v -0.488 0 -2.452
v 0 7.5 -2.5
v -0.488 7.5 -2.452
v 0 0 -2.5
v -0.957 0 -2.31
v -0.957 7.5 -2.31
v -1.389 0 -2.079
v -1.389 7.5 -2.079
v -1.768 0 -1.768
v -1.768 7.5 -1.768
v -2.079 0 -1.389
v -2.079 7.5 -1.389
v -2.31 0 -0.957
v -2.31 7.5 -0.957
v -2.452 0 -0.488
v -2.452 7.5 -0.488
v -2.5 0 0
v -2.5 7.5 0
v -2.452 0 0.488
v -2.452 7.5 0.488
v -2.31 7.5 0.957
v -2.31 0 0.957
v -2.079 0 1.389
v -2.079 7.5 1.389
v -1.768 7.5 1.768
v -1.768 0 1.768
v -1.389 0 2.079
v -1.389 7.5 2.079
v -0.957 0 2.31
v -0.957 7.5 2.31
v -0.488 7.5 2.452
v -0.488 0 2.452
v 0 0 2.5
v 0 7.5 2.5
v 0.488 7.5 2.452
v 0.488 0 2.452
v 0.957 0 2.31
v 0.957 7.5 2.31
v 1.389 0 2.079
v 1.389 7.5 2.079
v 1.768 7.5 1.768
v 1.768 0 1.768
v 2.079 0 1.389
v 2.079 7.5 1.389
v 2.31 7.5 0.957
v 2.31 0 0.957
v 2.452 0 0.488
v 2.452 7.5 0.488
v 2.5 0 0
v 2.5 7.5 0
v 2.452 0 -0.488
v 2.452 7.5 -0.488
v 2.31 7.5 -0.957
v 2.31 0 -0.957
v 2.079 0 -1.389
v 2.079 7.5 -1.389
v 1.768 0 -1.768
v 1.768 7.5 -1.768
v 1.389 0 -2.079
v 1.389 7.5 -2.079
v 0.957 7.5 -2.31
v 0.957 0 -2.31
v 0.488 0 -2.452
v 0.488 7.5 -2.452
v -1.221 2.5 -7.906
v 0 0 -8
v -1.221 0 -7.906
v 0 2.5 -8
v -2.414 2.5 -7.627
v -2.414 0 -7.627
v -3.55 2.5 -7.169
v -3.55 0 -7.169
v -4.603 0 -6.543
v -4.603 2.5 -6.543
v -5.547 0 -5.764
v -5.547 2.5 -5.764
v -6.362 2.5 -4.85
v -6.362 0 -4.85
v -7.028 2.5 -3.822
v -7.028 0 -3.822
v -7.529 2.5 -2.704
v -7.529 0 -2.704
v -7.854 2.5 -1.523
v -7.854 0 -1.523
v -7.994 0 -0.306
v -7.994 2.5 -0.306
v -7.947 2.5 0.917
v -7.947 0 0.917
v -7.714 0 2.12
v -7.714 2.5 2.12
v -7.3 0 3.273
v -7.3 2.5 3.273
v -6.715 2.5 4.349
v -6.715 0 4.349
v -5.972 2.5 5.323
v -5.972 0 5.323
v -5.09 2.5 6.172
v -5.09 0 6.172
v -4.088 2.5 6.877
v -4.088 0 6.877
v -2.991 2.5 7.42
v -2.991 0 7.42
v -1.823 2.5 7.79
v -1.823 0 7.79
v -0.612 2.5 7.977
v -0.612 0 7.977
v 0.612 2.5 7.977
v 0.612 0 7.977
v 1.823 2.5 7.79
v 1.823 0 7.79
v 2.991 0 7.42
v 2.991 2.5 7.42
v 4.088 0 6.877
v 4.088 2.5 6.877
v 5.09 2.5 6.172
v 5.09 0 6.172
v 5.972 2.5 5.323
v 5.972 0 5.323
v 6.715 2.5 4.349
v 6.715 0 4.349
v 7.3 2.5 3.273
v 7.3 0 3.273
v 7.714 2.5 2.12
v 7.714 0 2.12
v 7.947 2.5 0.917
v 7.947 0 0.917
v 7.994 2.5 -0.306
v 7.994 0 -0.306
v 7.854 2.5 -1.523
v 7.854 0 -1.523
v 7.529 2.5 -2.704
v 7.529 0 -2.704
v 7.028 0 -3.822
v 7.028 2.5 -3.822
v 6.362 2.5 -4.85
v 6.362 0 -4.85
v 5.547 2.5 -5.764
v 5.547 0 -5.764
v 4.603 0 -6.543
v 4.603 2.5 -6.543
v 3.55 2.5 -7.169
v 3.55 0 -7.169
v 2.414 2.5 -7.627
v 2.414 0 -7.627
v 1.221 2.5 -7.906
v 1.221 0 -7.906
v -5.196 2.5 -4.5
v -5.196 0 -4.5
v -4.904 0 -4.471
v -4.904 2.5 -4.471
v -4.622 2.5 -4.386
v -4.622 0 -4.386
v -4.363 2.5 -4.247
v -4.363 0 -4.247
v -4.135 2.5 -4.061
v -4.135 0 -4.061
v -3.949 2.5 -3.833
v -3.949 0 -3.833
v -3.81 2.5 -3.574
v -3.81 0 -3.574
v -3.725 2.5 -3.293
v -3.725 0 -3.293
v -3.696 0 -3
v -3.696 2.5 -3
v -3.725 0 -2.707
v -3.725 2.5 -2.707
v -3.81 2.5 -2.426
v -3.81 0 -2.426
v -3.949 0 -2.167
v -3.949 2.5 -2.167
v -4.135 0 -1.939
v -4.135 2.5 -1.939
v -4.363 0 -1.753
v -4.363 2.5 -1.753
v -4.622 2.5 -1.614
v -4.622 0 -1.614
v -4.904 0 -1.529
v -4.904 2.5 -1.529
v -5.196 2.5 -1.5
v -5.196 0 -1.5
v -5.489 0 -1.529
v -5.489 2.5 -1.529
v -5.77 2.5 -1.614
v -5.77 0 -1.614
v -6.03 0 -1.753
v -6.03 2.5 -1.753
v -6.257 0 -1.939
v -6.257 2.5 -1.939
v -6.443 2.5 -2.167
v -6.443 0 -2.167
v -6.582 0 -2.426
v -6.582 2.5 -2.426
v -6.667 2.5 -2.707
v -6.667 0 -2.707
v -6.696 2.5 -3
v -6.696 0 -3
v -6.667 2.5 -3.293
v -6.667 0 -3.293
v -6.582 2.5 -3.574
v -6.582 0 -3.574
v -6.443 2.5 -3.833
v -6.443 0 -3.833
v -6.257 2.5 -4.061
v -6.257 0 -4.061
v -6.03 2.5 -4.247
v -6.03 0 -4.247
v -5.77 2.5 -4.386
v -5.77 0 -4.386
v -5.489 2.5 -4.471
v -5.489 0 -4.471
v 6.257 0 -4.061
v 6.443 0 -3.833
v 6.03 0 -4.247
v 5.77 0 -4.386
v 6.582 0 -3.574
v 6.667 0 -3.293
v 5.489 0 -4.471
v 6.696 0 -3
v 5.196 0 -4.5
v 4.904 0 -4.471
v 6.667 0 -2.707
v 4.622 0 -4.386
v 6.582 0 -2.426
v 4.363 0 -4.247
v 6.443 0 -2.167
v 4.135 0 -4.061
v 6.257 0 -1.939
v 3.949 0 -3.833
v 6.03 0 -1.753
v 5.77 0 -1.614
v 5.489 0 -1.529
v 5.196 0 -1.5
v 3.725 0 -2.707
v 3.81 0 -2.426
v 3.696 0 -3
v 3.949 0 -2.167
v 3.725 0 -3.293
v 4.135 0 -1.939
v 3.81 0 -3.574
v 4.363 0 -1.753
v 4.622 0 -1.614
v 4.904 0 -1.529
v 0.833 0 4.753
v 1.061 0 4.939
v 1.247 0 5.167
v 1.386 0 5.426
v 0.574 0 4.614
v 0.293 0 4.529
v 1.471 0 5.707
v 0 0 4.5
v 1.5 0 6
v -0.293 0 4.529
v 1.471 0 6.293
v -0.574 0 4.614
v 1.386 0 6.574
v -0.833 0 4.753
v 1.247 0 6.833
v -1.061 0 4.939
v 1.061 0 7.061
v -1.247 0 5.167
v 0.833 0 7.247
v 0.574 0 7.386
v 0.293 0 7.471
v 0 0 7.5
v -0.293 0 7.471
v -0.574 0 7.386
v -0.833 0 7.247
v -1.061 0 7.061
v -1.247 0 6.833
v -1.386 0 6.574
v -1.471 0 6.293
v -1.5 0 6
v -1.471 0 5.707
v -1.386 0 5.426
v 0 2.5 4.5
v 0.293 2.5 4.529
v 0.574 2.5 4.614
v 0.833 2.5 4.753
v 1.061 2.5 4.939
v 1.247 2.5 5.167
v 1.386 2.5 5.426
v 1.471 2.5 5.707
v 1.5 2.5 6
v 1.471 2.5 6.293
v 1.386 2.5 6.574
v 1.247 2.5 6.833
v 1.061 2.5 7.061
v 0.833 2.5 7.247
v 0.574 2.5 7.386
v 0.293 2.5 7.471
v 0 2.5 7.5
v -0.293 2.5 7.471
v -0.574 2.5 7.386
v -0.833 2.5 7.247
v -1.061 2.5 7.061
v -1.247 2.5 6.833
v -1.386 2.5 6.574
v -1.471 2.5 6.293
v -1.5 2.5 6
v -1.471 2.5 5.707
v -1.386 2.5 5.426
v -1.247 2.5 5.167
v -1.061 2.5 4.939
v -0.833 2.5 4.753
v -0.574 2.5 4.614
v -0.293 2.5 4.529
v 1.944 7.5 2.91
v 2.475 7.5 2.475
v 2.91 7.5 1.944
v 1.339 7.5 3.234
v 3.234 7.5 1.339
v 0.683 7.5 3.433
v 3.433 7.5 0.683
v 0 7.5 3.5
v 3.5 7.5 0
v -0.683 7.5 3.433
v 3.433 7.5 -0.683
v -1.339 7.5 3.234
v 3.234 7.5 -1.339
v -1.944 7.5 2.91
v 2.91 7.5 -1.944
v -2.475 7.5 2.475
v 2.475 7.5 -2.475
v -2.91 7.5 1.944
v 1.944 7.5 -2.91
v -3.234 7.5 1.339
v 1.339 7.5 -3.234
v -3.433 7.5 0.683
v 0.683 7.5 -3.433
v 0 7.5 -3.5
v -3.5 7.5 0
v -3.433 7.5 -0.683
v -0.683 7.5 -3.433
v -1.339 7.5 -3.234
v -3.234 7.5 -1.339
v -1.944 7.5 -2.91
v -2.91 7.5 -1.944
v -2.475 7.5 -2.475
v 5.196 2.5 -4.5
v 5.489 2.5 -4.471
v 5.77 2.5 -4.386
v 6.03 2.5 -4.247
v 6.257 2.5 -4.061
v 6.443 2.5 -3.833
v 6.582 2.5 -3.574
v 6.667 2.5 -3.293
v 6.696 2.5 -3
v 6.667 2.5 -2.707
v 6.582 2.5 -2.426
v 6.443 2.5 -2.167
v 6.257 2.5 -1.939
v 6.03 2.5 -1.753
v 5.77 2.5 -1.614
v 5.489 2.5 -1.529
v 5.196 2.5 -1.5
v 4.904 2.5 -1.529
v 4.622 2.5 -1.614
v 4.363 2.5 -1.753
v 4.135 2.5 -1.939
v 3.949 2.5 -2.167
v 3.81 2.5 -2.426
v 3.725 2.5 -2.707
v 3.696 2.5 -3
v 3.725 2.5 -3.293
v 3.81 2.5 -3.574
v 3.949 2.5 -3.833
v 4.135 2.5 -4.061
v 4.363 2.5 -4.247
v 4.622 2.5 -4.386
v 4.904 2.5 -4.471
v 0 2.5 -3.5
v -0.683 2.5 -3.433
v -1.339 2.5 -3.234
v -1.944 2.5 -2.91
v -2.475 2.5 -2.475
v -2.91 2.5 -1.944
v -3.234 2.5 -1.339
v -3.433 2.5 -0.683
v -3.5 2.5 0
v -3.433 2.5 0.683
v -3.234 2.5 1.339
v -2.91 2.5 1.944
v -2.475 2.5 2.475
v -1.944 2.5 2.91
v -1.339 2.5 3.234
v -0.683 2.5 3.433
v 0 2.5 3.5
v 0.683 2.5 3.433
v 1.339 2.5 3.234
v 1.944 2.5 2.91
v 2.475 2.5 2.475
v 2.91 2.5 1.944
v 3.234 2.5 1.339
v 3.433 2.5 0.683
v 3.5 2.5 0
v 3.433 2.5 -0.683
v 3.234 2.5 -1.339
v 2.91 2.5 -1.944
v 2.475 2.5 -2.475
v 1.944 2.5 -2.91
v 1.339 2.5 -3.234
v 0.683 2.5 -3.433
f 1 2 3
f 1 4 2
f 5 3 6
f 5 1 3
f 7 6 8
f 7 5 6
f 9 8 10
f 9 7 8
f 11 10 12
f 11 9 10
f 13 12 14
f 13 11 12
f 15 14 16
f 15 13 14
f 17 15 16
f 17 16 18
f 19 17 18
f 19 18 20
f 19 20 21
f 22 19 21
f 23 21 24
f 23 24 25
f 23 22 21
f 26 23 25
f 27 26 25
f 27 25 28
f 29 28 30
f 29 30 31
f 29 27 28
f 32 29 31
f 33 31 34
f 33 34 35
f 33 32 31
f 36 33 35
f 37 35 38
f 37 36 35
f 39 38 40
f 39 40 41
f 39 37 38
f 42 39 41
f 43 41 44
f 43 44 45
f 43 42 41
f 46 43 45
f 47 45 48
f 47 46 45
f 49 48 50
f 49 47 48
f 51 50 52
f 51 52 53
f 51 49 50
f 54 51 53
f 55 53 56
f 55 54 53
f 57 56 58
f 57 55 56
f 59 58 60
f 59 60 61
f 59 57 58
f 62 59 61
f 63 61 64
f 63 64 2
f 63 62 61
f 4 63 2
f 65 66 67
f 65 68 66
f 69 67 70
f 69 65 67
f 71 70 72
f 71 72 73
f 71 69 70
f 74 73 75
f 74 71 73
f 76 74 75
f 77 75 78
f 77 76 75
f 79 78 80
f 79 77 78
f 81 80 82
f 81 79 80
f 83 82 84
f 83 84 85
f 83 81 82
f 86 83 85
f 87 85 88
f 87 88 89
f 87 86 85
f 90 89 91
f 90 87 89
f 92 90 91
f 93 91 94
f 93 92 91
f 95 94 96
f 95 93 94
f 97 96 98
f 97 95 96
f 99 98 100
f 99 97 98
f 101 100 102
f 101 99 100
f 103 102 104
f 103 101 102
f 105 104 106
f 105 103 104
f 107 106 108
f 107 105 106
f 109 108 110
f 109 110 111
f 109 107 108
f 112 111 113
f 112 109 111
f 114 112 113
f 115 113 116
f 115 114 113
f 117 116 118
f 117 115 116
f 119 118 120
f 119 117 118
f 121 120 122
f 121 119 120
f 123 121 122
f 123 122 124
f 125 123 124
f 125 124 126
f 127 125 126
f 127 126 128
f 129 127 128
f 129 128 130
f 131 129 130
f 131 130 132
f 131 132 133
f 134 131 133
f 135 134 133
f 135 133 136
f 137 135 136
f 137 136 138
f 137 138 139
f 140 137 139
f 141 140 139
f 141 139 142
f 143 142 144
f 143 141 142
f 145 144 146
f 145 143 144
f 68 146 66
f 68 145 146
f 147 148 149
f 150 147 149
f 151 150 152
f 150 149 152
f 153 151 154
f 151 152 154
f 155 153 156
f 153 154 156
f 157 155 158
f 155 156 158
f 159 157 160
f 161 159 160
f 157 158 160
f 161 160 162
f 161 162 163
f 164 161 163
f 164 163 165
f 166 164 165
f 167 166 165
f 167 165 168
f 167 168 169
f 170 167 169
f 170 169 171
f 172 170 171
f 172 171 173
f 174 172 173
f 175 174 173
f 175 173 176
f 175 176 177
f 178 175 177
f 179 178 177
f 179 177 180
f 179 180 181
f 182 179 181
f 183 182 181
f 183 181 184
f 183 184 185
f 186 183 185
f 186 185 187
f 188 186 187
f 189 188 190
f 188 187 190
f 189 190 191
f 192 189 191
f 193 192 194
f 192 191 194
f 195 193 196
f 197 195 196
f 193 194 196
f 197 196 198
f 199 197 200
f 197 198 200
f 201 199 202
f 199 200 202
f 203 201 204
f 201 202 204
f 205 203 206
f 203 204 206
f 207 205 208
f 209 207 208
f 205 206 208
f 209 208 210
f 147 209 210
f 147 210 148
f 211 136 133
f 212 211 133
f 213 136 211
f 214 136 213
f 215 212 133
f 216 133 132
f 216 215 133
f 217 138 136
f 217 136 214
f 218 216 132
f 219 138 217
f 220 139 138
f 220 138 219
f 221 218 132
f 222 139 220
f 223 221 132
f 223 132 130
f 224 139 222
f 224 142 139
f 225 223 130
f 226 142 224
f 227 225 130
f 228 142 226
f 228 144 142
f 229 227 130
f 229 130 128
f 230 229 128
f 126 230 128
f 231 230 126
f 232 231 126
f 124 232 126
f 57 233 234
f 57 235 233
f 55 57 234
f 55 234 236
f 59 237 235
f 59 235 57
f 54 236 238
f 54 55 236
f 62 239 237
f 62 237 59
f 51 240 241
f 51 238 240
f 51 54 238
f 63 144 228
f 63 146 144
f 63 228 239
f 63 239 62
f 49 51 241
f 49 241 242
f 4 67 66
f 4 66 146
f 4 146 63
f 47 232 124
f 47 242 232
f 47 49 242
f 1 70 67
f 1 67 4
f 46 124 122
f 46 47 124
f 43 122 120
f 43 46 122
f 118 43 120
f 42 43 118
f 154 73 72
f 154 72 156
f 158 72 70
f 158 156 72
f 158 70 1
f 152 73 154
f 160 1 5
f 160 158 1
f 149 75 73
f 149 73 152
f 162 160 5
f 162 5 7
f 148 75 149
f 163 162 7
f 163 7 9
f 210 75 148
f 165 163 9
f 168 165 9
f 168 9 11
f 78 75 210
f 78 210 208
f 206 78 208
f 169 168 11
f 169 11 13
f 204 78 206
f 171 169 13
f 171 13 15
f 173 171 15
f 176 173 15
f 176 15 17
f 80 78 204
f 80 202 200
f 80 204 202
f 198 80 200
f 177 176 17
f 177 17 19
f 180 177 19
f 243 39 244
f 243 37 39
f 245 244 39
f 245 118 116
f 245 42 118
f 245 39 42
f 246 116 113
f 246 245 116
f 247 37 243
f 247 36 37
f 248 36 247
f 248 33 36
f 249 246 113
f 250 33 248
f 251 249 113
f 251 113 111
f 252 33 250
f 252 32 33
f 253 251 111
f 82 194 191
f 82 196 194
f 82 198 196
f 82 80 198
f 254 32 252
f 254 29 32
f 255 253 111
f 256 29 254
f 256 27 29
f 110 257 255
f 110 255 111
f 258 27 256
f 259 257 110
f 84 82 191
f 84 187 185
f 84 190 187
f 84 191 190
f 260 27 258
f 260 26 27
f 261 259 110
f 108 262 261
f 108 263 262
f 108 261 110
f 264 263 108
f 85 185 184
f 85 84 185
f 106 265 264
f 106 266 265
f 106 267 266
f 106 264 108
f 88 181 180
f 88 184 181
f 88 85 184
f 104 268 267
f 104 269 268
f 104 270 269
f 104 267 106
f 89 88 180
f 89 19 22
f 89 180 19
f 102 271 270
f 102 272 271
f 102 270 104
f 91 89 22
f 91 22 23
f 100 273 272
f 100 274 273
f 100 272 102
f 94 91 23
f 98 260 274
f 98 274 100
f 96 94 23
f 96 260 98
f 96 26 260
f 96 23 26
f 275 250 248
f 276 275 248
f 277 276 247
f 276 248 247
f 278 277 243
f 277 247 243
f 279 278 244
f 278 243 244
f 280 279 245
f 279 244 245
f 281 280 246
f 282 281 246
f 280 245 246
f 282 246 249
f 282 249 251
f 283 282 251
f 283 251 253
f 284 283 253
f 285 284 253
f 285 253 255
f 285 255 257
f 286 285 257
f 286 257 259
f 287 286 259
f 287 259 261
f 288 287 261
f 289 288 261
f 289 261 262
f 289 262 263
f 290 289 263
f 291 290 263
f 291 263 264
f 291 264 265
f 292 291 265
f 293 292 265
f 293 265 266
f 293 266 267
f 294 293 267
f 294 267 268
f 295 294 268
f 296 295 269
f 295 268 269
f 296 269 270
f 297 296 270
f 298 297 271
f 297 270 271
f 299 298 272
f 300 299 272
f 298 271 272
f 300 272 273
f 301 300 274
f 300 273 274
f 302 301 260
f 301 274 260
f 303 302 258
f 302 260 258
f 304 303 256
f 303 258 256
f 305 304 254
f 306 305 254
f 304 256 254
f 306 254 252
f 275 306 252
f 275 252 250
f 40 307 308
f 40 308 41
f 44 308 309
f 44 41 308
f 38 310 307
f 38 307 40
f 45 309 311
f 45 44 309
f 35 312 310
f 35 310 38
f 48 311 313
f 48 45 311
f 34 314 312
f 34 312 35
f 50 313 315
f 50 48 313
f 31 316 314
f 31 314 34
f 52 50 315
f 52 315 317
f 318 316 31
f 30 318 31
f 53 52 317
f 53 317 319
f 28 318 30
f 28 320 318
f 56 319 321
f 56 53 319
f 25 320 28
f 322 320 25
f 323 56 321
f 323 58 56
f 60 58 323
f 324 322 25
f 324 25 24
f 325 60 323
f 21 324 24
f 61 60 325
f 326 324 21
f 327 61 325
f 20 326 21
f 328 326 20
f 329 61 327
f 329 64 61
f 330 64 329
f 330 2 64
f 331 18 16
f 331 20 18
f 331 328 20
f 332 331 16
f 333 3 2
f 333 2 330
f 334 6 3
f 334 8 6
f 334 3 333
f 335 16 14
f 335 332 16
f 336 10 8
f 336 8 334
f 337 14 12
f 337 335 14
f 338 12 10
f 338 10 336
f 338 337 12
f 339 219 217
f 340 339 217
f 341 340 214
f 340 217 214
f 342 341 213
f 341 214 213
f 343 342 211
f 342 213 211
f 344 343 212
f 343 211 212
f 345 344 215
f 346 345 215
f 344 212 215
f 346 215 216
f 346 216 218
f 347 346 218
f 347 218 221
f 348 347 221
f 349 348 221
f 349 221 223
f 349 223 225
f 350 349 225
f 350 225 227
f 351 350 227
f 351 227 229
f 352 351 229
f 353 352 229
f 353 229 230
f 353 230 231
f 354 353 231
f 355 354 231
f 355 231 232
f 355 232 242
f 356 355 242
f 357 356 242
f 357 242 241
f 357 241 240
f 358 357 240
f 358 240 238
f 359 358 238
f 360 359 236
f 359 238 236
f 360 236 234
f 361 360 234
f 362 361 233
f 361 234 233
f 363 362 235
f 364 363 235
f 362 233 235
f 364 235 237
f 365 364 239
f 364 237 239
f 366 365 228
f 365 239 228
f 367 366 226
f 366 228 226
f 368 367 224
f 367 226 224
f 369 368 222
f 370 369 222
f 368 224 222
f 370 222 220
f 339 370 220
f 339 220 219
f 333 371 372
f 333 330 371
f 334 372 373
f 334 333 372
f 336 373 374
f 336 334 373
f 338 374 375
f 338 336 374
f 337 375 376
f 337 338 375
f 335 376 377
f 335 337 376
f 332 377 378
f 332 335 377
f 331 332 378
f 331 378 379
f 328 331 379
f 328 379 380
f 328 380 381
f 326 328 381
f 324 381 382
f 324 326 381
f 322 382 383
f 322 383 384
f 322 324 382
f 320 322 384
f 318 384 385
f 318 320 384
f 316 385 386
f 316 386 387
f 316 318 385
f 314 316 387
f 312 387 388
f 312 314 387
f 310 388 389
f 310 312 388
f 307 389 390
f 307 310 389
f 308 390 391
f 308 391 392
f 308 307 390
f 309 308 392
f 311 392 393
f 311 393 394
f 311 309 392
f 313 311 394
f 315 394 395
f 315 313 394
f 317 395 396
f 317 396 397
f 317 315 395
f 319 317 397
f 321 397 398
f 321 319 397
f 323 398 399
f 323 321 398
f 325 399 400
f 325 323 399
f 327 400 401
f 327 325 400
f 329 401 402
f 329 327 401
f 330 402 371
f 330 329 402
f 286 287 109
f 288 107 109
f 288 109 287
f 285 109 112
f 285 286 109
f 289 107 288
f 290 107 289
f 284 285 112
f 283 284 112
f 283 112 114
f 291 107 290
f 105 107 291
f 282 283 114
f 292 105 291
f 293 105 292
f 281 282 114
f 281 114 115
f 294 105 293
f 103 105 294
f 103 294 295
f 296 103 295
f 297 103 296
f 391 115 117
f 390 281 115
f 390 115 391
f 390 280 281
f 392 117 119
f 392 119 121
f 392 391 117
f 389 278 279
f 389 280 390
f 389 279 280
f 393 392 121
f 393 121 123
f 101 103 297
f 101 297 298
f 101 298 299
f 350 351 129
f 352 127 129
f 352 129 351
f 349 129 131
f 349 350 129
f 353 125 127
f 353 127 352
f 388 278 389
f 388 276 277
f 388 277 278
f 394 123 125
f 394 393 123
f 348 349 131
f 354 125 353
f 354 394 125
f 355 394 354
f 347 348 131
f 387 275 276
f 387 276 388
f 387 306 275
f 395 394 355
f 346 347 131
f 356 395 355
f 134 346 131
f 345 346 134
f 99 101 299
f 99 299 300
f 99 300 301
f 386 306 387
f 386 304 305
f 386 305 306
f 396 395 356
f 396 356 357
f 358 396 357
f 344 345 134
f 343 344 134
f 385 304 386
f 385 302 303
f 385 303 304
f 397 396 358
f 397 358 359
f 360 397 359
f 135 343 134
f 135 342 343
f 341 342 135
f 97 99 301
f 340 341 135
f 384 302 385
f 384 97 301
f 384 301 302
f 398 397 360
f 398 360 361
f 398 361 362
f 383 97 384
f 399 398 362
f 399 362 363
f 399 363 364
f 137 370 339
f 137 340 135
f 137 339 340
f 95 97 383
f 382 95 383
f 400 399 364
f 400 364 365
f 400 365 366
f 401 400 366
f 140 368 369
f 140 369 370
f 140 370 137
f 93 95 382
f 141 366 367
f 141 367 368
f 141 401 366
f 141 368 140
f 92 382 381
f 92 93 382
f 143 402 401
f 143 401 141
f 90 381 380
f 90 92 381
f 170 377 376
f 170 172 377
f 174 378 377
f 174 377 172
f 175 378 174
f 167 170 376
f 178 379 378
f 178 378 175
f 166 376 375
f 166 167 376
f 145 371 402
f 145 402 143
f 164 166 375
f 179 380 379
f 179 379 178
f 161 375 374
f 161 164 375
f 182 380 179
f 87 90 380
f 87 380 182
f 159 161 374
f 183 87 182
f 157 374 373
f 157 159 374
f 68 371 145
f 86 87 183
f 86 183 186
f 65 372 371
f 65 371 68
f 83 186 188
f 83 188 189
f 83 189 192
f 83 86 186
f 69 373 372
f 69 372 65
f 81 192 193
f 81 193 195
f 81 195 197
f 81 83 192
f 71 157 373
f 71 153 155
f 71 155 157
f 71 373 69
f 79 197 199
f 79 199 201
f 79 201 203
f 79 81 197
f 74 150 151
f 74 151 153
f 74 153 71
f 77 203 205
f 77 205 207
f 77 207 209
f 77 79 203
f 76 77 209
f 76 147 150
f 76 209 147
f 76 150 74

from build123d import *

# Parameters (mm, degrees)
ESQUISSE2_R             = 1.5
ENL_V_MAT_EXTRU_1_DEPTH = 14.57387196


with BuildPart() as part:
    # Esquisse1 → Révolution1 (revolve)
    with BuildSketch(Plane.XY, mode=Mode.PRIVATE) as r_volution1_sk:
        Polygon((2.5, 0), (8, 0), (8, 2.5), (3.5, 2.5), (3.5, 7.5), (2.5, 7.5), align=None)
    revolve(r_volution1_sk.sketch.rotate(Axis((0, 0, 0), (0, 1, 0)), 90), axis=Axis((0, 0, 0), (0, 1, 0)))

    # Esquisse2 → Enlèv. mat.-Extru.1 (cut, through all)
    with BuildSketch(Plane.XZ):
        with Locations(Location((0, 6, 0), (0, 0, 270))):
            Circle(ESQUISSE2_R)
        with Locations(Location((5.196152423, -3, 0), (0, 0, 270))):
            Circle(ESQUISSE2_R)
        with Locations(Location((-5.196152423, -3, 0), (0, 0, 270))):
            Circle(ESQUISSE2_R)
    extrude(amount=-ENL_V_MAT_EXTRU_1_DEPTH, mode=Mode.SUBTRACT)


solid = part.part
